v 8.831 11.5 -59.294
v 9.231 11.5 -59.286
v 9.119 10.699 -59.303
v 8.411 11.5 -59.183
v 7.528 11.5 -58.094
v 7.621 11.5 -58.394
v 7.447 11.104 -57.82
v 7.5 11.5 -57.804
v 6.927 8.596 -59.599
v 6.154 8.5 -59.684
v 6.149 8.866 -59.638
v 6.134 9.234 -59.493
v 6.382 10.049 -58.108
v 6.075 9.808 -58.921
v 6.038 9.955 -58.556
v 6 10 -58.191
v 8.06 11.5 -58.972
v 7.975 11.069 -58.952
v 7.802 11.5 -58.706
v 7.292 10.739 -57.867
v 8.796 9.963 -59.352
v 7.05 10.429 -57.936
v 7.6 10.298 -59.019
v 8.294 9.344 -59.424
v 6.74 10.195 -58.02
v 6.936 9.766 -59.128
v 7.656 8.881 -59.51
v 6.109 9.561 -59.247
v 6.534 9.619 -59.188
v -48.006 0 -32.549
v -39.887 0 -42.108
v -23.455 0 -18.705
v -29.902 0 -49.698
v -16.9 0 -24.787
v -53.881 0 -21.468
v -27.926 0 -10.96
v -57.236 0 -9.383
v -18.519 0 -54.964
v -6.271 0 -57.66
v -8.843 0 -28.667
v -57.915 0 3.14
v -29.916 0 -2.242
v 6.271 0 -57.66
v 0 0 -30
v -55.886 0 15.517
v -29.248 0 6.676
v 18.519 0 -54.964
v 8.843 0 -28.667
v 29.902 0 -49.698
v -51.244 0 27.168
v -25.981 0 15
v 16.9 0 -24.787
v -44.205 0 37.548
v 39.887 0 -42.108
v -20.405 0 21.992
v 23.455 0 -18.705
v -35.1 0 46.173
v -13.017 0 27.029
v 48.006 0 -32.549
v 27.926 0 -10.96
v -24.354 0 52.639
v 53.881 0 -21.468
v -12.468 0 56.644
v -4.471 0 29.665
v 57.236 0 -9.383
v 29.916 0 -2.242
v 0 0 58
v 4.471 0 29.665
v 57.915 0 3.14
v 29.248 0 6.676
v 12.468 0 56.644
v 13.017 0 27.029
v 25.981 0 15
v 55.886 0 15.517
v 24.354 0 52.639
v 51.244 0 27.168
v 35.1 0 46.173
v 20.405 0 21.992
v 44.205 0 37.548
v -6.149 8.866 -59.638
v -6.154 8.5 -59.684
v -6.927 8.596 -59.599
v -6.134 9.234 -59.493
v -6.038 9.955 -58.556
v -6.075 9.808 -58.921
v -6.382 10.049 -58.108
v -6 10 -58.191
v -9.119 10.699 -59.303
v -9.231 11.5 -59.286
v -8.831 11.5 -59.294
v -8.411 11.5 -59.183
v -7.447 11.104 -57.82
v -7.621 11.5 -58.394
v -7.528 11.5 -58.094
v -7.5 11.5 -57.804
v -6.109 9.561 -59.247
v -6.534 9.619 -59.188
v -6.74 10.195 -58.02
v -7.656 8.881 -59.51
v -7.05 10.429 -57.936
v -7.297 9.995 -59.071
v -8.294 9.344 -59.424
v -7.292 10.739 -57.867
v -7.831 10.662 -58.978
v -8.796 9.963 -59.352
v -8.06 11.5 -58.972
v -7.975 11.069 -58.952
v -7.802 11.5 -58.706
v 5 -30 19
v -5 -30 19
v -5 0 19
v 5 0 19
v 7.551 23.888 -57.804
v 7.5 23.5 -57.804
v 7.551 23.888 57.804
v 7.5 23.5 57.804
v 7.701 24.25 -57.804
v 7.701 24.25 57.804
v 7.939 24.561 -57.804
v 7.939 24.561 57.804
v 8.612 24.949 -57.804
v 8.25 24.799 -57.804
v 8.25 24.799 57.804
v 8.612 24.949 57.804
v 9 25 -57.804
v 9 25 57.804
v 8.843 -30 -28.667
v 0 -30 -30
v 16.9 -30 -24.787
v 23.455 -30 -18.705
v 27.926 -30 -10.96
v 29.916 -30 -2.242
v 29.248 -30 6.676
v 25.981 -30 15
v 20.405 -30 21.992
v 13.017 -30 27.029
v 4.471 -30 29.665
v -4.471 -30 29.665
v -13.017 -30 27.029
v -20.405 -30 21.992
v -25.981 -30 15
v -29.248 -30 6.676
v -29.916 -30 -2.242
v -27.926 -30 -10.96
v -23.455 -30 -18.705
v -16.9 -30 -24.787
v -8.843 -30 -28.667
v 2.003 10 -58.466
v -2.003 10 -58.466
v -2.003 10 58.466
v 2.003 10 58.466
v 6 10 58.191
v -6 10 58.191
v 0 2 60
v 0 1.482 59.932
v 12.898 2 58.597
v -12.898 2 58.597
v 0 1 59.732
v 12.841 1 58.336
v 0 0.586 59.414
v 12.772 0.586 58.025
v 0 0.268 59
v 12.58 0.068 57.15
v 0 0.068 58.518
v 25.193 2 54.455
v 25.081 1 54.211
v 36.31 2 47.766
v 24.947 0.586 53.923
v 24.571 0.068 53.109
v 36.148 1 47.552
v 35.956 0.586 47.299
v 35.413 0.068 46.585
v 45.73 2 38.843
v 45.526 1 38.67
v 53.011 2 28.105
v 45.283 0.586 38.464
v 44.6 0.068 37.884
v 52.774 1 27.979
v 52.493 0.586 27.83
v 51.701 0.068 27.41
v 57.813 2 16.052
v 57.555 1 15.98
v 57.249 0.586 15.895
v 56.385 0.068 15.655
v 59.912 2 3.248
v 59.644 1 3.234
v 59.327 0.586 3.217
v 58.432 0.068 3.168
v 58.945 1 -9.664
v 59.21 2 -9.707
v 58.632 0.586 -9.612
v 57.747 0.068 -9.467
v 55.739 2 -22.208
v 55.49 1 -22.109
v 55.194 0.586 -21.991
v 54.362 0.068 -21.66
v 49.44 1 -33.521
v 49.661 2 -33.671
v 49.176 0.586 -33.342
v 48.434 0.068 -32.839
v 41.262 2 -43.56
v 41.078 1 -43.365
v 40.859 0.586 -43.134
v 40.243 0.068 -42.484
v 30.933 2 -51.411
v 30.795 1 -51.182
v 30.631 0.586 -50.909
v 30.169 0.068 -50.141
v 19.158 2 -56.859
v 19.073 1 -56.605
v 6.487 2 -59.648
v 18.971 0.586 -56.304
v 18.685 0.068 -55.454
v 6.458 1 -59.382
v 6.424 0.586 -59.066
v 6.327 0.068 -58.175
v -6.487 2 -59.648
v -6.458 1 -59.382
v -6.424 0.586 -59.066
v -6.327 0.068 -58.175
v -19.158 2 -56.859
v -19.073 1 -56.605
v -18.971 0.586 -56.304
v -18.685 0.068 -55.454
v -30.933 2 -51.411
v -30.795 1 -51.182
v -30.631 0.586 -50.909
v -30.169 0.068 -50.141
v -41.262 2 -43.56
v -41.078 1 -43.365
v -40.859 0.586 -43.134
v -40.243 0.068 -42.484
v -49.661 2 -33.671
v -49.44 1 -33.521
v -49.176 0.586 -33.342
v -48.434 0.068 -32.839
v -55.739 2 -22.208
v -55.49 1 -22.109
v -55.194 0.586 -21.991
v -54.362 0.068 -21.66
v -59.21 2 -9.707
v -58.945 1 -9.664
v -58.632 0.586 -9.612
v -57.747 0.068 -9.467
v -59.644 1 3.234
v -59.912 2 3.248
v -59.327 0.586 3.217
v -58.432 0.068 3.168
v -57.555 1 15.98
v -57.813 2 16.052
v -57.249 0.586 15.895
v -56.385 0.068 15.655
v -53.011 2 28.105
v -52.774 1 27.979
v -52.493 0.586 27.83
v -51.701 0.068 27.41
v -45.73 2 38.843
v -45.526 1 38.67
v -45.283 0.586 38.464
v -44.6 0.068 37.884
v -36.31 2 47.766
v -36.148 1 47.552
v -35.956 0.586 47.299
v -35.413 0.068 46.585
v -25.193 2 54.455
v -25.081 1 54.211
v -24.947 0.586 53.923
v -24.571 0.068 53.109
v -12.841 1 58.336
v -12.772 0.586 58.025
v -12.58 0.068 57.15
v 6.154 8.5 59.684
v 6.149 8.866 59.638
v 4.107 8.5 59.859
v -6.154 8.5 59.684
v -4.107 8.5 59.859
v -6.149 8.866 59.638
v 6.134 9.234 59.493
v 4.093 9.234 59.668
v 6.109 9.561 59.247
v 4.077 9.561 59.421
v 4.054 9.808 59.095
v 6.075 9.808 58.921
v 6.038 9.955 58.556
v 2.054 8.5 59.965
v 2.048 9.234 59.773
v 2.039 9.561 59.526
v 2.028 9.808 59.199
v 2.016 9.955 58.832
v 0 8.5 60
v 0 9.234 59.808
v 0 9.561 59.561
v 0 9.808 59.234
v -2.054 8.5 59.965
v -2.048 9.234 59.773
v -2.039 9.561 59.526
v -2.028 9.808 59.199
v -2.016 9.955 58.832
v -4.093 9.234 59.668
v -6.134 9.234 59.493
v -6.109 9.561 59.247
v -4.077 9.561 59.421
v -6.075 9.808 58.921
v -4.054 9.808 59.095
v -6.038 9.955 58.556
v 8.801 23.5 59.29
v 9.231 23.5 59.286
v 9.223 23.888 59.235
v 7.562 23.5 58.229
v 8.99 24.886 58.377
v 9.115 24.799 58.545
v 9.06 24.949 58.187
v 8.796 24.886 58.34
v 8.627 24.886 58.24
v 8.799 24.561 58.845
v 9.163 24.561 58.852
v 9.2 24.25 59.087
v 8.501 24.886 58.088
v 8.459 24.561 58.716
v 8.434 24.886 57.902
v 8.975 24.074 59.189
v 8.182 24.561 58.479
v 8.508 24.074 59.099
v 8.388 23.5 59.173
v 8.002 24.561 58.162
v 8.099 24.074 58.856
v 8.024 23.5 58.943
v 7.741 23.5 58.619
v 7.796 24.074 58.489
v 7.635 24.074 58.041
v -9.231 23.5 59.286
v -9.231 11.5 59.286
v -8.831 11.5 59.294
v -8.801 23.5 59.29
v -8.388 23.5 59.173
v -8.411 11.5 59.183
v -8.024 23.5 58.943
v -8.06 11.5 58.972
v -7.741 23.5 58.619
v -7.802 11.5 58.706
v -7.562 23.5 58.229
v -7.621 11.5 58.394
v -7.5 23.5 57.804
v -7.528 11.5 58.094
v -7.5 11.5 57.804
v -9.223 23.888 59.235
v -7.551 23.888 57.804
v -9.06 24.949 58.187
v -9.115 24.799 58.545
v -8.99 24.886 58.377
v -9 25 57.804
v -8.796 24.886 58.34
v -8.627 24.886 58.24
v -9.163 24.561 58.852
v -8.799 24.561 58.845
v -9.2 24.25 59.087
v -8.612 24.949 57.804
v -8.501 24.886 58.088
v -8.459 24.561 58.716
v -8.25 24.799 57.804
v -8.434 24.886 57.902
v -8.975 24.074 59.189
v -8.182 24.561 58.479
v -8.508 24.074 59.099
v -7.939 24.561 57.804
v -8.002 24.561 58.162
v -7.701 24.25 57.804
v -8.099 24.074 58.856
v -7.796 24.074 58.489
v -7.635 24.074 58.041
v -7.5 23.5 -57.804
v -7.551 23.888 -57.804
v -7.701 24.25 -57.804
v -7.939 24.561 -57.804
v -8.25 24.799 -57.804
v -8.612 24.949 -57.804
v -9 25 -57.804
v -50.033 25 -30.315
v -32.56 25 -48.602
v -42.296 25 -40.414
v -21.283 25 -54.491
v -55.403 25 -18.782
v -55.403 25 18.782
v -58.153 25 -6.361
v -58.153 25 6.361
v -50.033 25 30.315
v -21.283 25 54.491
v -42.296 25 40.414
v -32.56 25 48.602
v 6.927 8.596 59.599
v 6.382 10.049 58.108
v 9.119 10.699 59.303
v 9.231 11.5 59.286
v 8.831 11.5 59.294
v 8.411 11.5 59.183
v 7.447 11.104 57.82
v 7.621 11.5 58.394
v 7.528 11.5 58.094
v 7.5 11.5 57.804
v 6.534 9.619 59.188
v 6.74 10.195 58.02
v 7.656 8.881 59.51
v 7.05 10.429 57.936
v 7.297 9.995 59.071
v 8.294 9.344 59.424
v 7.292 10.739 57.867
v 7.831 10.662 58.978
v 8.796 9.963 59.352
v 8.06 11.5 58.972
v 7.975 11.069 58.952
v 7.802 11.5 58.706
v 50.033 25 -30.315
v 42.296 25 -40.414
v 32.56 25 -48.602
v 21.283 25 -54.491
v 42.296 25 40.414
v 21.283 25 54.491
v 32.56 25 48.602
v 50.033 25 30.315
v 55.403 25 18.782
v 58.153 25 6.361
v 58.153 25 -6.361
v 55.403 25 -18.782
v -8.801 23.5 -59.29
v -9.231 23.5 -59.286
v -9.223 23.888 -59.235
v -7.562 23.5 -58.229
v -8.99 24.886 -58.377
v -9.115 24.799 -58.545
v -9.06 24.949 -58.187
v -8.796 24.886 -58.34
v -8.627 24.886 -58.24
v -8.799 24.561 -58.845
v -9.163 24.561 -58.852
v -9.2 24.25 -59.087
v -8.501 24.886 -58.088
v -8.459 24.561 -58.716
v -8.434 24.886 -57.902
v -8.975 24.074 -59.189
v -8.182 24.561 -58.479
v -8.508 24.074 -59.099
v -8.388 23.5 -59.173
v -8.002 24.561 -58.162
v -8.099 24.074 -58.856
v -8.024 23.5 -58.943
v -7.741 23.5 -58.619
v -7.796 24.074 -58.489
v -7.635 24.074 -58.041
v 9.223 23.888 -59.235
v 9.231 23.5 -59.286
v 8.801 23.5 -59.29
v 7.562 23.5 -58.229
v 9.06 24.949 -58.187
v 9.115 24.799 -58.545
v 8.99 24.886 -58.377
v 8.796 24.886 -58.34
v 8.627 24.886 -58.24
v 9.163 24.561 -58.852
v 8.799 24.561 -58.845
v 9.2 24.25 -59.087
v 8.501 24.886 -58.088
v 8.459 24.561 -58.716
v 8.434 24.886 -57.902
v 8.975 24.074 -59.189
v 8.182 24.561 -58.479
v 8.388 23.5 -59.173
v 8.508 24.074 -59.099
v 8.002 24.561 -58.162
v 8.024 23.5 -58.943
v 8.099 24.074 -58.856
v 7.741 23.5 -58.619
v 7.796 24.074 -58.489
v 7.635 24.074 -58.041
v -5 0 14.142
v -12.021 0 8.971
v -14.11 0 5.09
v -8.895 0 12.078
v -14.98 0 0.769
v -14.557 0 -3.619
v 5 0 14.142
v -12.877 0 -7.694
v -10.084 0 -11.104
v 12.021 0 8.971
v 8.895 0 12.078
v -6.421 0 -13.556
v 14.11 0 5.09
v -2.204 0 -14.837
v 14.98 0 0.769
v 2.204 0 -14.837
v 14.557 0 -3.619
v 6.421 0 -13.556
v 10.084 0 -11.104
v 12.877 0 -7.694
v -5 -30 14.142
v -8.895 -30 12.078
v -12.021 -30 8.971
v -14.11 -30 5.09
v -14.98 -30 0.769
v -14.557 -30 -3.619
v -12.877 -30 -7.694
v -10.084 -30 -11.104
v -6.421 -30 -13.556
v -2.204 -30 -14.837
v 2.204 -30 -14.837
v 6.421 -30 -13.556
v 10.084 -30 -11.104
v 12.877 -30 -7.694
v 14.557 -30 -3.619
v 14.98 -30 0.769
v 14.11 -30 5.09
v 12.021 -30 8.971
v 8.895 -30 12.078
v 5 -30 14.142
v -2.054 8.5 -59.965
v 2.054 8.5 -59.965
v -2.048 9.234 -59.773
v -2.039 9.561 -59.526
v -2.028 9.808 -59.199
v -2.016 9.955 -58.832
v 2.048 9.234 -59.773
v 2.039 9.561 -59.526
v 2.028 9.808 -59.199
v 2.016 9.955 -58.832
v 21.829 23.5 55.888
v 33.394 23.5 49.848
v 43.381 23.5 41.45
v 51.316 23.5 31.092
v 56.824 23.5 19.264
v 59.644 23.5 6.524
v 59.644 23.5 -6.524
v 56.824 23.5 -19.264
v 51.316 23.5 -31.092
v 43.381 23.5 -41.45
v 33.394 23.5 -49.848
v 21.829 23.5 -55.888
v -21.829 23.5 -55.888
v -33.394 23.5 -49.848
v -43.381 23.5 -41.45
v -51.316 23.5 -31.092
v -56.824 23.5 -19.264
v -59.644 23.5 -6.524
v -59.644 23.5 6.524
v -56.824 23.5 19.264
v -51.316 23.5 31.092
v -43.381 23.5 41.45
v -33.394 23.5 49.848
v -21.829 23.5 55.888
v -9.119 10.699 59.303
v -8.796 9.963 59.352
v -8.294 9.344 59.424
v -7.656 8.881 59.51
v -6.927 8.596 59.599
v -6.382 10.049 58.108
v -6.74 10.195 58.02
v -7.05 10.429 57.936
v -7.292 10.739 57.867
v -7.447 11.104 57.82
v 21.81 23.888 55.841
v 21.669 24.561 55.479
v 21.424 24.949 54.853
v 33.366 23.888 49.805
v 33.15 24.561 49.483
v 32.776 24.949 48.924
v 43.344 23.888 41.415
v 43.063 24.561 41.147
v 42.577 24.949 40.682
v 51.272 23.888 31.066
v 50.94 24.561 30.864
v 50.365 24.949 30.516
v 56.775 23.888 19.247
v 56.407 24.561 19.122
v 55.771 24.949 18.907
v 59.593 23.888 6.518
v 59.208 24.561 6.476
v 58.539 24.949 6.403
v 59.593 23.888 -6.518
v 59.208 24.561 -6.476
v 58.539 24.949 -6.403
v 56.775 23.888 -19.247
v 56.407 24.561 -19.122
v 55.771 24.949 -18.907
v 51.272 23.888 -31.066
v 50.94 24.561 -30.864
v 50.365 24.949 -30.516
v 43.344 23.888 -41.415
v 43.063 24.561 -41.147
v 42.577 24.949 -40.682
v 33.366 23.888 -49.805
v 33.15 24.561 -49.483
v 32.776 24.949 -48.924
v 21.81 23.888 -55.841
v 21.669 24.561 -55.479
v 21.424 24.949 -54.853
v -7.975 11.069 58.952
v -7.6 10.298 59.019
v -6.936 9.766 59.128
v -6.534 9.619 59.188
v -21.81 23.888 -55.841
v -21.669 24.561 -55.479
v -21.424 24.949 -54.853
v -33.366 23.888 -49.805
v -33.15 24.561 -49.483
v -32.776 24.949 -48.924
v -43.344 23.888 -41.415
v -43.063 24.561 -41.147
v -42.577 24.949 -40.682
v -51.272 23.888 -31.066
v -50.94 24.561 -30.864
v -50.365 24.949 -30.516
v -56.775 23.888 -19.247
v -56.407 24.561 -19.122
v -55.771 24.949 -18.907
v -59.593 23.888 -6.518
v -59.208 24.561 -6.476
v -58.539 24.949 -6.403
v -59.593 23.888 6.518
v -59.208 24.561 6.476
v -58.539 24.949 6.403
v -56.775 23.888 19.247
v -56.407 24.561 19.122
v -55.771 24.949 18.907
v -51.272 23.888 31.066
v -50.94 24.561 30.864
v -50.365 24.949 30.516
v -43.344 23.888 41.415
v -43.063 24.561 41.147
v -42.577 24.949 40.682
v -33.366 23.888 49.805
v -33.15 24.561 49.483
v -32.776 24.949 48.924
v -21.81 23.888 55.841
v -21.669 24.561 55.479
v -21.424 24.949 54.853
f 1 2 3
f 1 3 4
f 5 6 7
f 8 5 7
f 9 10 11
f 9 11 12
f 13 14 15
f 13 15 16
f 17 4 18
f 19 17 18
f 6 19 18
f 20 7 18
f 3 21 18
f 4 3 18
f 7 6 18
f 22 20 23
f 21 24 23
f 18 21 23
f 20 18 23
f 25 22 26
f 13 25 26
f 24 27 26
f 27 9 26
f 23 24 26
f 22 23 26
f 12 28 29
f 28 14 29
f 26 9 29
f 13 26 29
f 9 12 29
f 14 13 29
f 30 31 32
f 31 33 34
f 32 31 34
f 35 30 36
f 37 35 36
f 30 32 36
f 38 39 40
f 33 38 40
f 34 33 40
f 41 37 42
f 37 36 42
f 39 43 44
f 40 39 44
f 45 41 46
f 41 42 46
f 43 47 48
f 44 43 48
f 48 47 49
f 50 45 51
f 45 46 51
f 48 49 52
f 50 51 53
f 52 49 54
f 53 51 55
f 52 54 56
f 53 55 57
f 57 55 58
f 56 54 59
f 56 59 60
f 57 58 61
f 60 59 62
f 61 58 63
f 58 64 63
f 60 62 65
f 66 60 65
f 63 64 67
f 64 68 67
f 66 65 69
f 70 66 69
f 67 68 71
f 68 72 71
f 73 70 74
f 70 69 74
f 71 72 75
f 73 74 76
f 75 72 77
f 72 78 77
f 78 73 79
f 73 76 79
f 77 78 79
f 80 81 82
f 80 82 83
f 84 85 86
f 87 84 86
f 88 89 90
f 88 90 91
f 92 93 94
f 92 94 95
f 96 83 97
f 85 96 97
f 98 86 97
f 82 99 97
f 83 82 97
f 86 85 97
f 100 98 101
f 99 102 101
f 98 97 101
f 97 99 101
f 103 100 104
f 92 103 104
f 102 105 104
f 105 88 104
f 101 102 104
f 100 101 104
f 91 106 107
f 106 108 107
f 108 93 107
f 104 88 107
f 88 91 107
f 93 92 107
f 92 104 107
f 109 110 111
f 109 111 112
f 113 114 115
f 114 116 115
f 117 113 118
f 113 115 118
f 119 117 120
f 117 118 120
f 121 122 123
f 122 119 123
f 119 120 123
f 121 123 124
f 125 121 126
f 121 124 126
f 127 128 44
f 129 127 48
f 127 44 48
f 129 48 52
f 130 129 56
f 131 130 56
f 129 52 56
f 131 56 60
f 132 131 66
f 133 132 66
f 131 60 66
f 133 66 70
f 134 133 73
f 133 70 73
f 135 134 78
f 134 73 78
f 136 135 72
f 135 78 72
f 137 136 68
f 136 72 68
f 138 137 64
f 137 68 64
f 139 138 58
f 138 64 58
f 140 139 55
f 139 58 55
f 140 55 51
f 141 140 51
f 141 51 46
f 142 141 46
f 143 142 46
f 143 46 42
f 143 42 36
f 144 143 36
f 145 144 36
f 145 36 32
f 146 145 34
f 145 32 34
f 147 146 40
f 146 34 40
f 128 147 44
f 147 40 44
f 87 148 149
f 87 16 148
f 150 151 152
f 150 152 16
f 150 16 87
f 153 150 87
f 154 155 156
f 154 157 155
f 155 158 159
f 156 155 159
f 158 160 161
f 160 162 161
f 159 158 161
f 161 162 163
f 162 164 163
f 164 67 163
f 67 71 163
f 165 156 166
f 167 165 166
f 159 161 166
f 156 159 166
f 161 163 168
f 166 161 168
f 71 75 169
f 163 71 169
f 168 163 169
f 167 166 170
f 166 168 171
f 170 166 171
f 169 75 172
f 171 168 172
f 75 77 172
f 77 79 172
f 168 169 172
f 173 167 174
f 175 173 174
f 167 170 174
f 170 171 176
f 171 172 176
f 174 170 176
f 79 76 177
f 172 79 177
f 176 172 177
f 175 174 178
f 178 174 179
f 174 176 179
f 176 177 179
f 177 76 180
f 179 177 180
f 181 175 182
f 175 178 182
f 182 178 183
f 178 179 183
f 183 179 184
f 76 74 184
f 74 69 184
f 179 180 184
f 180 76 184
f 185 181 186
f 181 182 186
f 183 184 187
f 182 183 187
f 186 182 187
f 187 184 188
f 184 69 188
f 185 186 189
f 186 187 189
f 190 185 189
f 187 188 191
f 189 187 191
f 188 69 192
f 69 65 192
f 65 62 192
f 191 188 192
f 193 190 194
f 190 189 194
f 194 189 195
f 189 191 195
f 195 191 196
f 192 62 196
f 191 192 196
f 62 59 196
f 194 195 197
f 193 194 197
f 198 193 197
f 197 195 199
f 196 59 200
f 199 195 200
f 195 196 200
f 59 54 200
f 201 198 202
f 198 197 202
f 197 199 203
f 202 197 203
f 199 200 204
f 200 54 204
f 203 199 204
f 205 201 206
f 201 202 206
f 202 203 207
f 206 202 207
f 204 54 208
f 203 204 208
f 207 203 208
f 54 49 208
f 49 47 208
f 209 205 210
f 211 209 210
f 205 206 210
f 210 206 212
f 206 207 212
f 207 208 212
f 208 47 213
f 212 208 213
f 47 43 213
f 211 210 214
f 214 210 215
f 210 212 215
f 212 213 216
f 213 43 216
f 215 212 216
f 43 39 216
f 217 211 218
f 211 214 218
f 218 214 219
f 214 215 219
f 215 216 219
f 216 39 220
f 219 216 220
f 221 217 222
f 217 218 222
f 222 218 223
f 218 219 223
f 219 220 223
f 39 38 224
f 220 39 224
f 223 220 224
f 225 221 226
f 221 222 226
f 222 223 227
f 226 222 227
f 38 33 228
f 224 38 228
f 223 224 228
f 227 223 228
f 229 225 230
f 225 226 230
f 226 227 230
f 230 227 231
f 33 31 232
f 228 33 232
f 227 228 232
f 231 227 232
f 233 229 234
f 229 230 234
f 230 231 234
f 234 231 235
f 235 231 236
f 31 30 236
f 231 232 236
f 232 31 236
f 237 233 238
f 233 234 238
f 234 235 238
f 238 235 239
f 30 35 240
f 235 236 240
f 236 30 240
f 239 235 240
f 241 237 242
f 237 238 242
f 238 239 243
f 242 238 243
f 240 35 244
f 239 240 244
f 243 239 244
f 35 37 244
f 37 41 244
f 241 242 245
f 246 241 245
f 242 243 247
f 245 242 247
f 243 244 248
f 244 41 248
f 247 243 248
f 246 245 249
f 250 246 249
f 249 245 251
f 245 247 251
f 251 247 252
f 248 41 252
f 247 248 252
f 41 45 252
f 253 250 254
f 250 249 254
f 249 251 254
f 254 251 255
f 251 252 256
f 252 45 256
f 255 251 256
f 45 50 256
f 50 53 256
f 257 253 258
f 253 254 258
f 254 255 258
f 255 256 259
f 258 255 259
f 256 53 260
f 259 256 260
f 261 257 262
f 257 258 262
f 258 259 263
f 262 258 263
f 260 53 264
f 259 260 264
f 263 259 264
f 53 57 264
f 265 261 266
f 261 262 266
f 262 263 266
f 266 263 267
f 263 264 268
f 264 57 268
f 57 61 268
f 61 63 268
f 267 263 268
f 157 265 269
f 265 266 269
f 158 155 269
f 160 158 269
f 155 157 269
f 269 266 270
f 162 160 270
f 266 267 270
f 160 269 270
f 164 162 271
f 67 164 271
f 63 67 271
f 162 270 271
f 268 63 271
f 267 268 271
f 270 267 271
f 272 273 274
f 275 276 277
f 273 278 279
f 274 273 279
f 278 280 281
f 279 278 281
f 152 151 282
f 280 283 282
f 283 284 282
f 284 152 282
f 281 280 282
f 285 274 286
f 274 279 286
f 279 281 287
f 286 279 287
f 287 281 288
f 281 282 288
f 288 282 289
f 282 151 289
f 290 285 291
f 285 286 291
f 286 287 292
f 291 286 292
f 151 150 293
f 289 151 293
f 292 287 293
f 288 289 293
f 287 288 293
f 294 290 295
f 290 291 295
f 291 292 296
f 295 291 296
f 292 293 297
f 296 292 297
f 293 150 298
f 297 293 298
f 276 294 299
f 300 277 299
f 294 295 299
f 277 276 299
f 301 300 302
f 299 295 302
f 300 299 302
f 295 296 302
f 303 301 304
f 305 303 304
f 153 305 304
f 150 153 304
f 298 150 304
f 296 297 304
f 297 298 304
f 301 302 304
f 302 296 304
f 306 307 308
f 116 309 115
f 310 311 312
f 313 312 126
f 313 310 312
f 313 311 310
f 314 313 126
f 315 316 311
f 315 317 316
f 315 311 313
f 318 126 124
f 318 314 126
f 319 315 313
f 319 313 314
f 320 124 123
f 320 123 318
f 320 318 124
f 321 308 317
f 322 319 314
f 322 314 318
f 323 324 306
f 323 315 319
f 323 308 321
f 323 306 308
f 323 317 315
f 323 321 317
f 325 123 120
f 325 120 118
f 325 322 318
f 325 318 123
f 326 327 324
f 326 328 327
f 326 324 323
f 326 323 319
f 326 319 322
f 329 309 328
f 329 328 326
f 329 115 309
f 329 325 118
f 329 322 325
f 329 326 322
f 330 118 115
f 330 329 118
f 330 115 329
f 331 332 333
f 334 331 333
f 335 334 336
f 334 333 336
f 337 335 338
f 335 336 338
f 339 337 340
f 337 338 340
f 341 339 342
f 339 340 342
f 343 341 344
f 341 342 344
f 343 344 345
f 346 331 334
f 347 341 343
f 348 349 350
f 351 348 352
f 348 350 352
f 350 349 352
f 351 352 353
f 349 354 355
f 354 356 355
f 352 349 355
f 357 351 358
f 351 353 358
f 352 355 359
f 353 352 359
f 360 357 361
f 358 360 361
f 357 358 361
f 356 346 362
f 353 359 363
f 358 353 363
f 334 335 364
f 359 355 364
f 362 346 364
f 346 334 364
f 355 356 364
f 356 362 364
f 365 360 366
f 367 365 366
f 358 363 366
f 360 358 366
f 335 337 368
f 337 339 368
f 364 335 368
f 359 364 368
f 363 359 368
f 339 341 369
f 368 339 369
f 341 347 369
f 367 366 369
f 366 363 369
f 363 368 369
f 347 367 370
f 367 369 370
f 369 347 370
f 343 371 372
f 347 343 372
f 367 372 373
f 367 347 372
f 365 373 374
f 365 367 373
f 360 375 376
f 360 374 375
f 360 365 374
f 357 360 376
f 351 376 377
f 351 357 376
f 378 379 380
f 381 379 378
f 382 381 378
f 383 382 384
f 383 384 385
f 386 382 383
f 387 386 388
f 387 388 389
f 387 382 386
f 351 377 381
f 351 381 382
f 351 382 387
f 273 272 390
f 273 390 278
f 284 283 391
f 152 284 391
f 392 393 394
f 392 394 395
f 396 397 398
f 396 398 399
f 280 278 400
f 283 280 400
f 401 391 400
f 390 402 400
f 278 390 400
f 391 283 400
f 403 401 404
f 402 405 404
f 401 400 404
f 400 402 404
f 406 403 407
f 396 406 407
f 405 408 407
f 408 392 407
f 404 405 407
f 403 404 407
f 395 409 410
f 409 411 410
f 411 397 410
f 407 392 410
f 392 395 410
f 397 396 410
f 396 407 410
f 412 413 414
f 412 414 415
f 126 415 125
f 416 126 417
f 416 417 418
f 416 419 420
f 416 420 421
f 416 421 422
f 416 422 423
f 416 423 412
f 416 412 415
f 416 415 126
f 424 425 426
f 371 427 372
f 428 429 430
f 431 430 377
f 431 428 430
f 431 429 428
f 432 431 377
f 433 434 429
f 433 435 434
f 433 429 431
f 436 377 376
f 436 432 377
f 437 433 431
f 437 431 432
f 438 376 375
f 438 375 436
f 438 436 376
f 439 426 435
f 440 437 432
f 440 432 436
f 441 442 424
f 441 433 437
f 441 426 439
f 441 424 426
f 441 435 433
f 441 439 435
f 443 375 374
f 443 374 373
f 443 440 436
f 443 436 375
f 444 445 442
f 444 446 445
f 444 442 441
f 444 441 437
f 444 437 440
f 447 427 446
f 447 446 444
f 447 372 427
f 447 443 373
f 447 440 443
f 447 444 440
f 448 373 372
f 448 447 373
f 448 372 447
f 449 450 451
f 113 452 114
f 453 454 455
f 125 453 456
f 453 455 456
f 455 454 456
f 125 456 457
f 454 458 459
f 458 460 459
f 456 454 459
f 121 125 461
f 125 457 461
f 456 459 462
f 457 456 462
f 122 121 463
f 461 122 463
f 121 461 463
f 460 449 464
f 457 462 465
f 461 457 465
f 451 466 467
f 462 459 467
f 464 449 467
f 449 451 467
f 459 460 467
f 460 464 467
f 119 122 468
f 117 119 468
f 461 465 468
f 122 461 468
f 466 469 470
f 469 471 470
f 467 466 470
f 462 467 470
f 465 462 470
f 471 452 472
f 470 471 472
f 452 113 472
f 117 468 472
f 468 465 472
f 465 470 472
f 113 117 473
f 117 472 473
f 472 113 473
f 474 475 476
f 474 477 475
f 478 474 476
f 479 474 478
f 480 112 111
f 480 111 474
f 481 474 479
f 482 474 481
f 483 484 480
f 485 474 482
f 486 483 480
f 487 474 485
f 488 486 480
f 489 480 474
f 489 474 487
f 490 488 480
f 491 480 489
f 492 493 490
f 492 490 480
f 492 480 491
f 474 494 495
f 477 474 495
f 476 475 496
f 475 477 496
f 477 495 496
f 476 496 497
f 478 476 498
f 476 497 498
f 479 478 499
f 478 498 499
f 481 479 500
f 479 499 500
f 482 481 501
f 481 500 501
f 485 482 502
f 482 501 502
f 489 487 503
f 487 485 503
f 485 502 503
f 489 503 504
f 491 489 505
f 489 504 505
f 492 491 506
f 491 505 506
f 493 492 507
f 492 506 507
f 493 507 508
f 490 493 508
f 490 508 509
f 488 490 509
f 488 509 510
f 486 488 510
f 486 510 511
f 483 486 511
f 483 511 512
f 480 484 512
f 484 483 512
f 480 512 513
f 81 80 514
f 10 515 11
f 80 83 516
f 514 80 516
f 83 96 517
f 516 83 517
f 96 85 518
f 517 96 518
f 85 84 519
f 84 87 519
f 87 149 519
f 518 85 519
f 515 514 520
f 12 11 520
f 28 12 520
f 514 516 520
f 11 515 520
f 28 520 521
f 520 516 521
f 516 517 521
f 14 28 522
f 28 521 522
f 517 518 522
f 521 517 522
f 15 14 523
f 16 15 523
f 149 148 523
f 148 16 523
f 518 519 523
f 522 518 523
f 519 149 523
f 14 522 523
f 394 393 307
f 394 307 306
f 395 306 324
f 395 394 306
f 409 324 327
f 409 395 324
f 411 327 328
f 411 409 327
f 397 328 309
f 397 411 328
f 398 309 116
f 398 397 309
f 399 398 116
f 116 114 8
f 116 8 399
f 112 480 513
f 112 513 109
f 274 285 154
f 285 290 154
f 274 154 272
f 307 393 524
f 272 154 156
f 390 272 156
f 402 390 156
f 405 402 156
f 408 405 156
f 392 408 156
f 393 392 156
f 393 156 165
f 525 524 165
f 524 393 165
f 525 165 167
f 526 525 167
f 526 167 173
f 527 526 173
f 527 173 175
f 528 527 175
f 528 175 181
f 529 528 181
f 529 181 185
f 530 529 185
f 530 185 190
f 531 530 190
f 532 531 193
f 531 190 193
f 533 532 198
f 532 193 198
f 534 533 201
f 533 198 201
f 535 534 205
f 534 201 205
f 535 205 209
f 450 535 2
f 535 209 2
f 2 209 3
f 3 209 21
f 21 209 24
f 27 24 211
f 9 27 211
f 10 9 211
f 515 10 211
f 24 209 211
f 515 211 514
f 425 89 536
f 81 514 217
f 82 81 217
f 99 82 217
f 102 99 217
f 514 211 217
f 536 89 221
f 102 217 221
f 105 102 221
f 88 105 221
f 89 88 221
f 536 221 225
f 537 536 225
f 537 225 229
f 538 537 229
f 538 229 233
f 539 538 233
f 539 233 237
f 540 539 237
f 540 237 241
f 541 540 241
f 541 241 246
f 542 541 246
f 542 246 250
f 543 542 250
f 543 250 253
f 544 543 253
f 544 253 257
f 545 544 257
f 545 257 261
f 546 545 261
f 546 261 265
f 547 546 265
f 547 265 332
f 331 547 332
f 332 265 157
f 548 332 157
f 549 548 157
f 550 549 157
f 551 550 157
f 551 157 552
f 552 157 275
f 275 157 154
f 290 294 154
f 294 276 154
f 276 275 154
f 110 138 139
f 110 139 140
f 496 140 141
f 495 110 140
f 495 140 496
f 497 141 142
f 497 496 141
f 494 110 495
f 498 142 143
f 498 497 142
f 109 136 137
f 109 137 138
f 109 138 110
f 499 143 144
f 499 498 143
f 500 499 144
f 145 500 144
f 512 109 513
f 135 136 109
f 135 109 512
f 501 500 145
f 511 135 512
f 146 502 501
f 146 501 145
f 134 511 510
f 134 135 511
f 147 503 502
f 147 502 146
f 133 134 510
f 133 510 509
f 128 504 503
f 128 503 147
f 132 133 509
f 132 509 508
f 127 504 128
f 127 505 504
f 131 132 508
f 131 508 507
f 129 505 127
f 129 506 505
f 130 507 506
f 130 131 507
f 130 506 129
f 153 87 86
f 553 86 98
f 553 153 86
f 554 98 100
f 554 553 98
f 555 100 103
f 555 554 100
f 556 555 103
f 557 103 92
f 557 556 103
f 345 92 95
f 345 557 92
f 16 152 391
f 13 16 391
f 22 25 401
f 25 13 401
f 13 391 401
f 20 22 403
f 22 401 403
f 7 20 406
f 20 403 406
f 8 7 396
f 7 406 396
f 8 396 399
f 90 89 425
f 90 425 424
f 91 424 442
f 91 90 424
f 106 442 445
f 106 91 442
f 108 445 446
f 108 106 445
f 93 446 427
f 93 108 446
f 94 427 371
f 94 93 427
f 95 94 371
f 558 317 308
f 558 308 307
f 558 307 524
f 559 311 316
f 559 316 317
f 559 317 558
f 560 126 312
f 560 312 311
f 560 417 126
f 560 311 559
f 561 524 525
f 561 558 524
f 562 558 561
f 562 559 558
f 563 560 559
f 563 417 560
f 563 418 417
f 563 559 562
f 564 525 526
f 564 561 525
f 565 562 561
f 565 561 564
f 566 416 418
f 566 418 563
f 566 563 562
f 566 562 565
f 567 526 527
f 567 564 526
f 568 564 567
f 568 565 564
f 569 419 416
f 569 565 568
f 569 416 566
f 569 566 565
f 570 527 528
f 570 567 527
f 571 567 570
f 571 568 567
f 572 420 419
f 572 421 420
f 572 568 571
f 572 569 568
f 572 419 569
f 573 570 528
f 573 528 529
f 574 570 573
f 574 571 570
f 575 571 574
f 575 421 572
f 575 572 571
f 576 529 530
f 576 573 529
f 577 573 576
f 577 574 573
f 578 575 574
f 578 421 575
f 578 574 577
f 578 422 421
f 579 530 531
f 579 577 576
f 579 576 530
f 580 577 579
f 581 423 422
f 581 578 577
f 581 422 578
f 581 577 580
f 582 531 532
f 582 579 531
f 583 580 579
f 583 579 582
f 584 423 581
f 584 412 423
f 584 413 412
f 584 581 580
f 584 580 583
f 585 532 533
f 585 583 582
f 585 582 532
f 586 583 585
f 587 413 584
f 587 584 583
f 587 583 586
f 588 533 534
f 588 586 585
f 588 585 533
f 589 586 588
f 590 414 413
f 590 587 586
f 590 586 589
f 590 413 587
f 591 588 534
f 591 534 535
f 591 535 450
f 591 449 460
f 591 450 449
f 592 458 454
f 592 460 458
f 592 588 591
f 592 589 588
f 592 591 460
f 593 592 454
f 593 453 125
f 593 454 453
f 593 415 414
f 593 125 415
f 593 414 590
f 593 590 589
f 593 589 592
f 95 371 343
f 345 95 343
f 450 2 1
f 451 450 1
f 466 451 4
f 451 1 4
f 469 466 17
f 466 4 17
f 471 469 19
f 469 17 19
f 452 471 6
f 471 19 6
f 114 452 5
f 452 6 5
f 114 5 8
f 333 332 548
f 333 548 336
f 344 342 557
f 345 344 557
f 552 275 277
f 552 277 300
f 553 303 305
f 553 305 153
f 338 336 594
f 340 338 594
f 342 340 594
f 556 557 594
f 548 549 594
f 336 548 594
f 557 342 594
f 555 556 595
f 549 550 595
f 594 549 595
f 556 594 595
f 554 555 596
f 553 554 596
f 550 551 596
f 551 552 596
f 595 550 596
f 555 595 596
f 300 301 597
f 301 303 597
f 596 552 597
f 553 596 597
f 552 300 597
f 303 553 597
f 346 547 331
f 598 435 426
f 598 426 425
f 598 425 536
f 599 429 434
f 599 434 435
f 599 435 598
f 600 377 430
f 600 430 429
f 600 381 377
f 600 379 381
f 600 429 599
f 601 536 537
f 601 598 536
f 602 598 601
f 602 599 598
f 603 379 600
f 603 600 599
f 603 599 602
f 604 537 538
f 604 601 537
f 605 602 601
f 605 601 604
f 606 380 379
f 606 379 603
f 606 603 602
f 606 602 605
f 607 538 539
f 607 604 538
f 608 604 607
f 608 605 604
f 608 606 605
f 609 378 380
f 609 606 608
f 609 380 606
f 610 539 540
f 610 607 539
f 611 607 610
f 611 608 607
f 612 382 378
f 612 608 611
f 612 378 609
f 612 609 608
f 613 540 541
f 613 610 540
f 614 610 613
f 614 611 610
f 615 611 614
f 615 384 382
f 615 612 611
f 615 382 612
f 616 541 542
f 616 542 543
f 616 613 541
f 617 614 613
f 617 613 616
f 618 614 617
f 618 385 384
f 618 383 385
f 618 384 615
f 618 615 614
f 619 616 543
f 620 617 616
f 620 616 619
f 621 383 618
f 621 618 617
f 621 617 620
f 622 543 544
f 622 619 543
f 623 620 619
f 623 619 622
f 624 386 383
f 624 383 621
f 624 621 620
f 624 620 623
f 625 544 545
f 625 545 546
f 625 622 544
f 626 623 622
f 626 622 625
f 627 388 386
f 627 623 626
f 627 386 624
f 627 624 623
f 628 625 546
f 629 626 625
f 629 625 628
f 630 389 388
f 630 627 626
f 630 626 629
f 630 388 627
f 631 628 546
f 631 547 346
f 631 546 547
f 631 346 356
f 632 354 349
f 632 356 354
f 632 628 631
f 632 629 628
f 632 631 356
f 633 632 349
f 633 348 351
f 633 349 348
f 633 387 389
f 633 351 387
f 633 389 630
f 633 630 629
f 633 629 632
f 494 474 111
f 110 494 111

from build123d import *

# Parameters (mm, degrees)
SKETCH2_R           = 60
BOSS_EXTRUDE1_DEPTH = 25
SKETCH3_R           = 30
BOSS_EXTRUDE2_DEPTH = 30
SKETCH4_R           = 15
CUT_EXTRUDE1_DEPTH  = 30
SKETCH5_W           = 10
SKETCH5_H           = 8
CUT_EXTRUDE2_DEPTH  = 30
SKETCH6_W           = 15
SKETCH6_H           = 130
CUT_EXTRUDE3_DEPTH  = 15
FILLET1_R           = 2
FILLET2_R           = 1.5


with BuildPart() as part:
    # Sketch2 → Boss-Extrude1 (new body)
    with BuildSketch(Plane(origin=(0, 0, 0), x_dir=(-1, 0, 0), z_dir=(0, 1, 0))):
        with Locations(Location((0, 0, 0), (0, 0, 90))):
            Circle(SKETCH2_R)
    extrude(amount=BOSS_EXTRUDE1_DEPTH)

    # Sketch3 → Boss-Extrude2 (add)
    with BuildSketch(Plane.XZ):
        with Locations(Location((0, 0, 0), (0, 0, 270))):
            Circle(SKETCH3_R)
    extrude(amount=BOSS_EXTRUDE2_DEPTH)

    # Sketch4 → Cut-Extrude1 (cut)
    with BuildSketch(Plane.XZ.offset(30)):
        with Locations(Location((0, 0, 0), (0, 0, 270))):
            Circle(SKETCH4_R)
    extrude(amount=-CUT_EXTRUDE1_DEPTH, mode=Mode.SUBTRACT)

    # Sketch5 → Cut-Extrude2 (cut)
    with BuildSketch(Plane.XZ.offset(30)):
        with Locations((0, 15)):
            Rectangle(SKETCH5_W, SKETCH5_H)
    extrude(amount=-CUT_EXTRUDE2_DEPTH, mode=Mode.SUBTRACT)

    # Sketch6 → Cut-Extrude3 (cut)
    with BuildSketch(Plane(origin=(0, 25, 0), x_dir=(-1, 0, 0), z_dir=(0, 1, 0))):
        Rectangle(SKETCH6_W, SKETCH6_H)
    extrude(amount=-CUT_EXTRUDE3_DEPTH, mode=Mode.SUBTRACT)

    # Fillet1
    fillet1_edges = [part.edges().sort_by_distance(p)[0] for p in [
        (0, 0, -60),
    ]]
    fillet(fillet1_edges, radius=FILLET1_R)

    # Fillet2
    fillet2_edges = [part.edges().sort_by_distance(p)[0] for p in [
        (-60, 25, 0),
        (7.5, 25, 0),
        (-7.5, 25, 0),
        (0, 10, -60),
        (3.757374753, 10, 59.882235554),
        (-7.5, 17.5, -59.529404499),
        (-7.5, 10, 0),
        (-7.5, 17.5, 59.529404499),
        (7.5, 17.5, 59.529404499),
        (7.5, 10, 0),
        (7.5, 17.5, -59.529404499),
        (60, 25, 0),
    ]]
    fillet(fillet2_edges, radius=FILLET2_R)


solid = part.part
